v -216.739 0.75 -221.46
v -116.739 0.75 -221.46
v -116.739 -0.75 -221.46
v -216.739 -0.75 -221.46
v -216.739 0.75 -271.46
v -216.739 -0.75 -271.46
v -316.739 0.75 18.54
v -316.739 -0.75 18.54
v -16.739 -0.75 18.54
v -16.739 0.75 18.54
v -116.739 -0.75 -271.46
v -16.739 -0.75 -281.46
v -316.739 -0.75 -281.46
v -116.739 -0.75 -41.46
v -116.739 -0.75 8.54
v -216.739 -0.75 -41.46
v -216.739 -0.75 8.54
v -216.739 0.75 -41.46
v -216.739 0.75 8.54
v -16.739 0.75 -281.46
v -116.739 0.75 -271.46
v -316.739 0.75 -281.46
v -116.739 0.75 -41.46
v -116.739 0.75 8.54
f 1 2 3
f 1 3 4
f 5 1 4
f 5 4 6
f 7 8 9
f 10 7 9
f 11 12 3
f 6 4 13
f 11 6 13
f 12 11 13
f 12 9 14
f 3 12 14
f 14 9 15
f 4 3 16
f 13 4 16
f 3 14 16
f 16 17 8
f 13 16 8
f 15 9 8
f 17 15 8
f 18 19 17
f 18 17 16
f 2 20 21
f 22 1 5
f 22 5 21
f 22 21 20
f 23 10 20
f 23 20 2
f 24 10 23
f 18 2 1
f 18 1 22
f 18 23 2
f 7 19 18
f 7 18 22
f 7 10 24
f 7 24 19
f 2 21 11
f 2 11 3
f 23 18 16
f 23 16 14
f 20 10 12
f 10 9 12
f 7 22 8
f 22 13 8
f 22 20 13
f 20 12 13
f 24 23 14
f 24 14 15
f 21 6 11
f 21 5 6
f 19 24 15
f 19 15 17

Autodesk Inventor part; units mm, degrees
ref_plane "YZ Plane" through (0, 0, 0) normal (1, 0, 0) x (0, 1, 0)
ref_plane "XZ Plane" through (0, 0, 0) normal (0, 1, 0) x (-1, 0, 0)
ref_plane "XY Plane" through (0, 0, 0) normal (0, 0, 1) x (1, 0, 0)
sketch "Boceto1" plane through (0, 0, 0) normal (0, 1, 0) x (-1, 0, 0)
  line L0 (16.7386, 18.54) -> (16.7386, -281.46)
  line L1 (16.7386, -281.46) -> (316.7386, -281.46)
  line L2 (316.7386, -281.46) -> (316.7386, 18.54)
  line L3 (316.7386, 18.54) -> (16.7386, 18.54)
  point P0 (0, 0)
  dimension "d2" = 300
  dimension "d3" = 300
extrude "Extrusión1" add sketch "Boceto1" along normal mid plane 1.5
sketch "Boceto2" plane through (0, 0.75, 0) normal (0, 1, 0) x (1, 0, 0)
  line L0 (-316.7386, -18.54) -> (-16.7386, -18.54) projected
  line L1 (-16.7386, 281.46) -> (-316.7386, 281.46) projected
  line L2 (-316.7386, 281.46) -> (-316.7386, -18.54) projected
  line L3 (-316.7386, 131.46) -> (-16.7386, 131.46)
  line L4 (-16.7386, -18.54) -> (-16.7386, 281.46) projected
  line L5 (-166.7386, -18.54) -> (-166.7386, -8.54)
  line L6 (-166.7386, 281.46) -> (-166.7386, 271.46)
  line L7 (-166.7386, 271.46) -> (-116.7386, 271.46)
  line L8 (-116.7386, 271.46) -> (-116.7386, 221.46)
  line L9 (-116.7386, 221.46) -> (-166.7386, 221.46)
  line L10 (-166.7386, 221.46) -> (-216.7386, 221.46)
  line L11 (-216.7386, 221.46) -> (-216.7386, 271.46)
  line L12 (-216.7386, 271.46) -> (-166.7386, 271.46)
  line L13 (-166.7386, -8.54) -> (-216.7386, -8.54)
  line L14 (-216.7386, -8.54) -> (-216.7386, 41.46)
  line L15 (-216.7386, 41.46) -> (-166.7386, 41.46)
  line L16 (-116.7386, 41.46) -> (-166.7386, 41.46)
  line L17 (-116.7386, -8.54) -> (-166.7386, -8.54)
  line L18 (-116.7386, 41.46) -> (-116.7386, -8.54)
  line L19 (-166.7386, -18.54) -> (-166.7386, -8.54)
  line L20 (-166.7386, 271.46) -> (-166.7386, 281.46)
  point P0 (0, 0)
  dimension "d6" = 10
  dimension "d7" = 10
  dimension "d8" = 50
  dimension "d9" = 50
  dimension "d10" = 50
  dimension "d11" = 50
  dimension "d12" = 50
extrude "Extrusión2" cut sketch "Boceto2" against normal blind 4 contours L13 L14 L15 L16 L18 L17 | L7 L8 L9 L10 L11 L12
properties part number "base 30x30"
